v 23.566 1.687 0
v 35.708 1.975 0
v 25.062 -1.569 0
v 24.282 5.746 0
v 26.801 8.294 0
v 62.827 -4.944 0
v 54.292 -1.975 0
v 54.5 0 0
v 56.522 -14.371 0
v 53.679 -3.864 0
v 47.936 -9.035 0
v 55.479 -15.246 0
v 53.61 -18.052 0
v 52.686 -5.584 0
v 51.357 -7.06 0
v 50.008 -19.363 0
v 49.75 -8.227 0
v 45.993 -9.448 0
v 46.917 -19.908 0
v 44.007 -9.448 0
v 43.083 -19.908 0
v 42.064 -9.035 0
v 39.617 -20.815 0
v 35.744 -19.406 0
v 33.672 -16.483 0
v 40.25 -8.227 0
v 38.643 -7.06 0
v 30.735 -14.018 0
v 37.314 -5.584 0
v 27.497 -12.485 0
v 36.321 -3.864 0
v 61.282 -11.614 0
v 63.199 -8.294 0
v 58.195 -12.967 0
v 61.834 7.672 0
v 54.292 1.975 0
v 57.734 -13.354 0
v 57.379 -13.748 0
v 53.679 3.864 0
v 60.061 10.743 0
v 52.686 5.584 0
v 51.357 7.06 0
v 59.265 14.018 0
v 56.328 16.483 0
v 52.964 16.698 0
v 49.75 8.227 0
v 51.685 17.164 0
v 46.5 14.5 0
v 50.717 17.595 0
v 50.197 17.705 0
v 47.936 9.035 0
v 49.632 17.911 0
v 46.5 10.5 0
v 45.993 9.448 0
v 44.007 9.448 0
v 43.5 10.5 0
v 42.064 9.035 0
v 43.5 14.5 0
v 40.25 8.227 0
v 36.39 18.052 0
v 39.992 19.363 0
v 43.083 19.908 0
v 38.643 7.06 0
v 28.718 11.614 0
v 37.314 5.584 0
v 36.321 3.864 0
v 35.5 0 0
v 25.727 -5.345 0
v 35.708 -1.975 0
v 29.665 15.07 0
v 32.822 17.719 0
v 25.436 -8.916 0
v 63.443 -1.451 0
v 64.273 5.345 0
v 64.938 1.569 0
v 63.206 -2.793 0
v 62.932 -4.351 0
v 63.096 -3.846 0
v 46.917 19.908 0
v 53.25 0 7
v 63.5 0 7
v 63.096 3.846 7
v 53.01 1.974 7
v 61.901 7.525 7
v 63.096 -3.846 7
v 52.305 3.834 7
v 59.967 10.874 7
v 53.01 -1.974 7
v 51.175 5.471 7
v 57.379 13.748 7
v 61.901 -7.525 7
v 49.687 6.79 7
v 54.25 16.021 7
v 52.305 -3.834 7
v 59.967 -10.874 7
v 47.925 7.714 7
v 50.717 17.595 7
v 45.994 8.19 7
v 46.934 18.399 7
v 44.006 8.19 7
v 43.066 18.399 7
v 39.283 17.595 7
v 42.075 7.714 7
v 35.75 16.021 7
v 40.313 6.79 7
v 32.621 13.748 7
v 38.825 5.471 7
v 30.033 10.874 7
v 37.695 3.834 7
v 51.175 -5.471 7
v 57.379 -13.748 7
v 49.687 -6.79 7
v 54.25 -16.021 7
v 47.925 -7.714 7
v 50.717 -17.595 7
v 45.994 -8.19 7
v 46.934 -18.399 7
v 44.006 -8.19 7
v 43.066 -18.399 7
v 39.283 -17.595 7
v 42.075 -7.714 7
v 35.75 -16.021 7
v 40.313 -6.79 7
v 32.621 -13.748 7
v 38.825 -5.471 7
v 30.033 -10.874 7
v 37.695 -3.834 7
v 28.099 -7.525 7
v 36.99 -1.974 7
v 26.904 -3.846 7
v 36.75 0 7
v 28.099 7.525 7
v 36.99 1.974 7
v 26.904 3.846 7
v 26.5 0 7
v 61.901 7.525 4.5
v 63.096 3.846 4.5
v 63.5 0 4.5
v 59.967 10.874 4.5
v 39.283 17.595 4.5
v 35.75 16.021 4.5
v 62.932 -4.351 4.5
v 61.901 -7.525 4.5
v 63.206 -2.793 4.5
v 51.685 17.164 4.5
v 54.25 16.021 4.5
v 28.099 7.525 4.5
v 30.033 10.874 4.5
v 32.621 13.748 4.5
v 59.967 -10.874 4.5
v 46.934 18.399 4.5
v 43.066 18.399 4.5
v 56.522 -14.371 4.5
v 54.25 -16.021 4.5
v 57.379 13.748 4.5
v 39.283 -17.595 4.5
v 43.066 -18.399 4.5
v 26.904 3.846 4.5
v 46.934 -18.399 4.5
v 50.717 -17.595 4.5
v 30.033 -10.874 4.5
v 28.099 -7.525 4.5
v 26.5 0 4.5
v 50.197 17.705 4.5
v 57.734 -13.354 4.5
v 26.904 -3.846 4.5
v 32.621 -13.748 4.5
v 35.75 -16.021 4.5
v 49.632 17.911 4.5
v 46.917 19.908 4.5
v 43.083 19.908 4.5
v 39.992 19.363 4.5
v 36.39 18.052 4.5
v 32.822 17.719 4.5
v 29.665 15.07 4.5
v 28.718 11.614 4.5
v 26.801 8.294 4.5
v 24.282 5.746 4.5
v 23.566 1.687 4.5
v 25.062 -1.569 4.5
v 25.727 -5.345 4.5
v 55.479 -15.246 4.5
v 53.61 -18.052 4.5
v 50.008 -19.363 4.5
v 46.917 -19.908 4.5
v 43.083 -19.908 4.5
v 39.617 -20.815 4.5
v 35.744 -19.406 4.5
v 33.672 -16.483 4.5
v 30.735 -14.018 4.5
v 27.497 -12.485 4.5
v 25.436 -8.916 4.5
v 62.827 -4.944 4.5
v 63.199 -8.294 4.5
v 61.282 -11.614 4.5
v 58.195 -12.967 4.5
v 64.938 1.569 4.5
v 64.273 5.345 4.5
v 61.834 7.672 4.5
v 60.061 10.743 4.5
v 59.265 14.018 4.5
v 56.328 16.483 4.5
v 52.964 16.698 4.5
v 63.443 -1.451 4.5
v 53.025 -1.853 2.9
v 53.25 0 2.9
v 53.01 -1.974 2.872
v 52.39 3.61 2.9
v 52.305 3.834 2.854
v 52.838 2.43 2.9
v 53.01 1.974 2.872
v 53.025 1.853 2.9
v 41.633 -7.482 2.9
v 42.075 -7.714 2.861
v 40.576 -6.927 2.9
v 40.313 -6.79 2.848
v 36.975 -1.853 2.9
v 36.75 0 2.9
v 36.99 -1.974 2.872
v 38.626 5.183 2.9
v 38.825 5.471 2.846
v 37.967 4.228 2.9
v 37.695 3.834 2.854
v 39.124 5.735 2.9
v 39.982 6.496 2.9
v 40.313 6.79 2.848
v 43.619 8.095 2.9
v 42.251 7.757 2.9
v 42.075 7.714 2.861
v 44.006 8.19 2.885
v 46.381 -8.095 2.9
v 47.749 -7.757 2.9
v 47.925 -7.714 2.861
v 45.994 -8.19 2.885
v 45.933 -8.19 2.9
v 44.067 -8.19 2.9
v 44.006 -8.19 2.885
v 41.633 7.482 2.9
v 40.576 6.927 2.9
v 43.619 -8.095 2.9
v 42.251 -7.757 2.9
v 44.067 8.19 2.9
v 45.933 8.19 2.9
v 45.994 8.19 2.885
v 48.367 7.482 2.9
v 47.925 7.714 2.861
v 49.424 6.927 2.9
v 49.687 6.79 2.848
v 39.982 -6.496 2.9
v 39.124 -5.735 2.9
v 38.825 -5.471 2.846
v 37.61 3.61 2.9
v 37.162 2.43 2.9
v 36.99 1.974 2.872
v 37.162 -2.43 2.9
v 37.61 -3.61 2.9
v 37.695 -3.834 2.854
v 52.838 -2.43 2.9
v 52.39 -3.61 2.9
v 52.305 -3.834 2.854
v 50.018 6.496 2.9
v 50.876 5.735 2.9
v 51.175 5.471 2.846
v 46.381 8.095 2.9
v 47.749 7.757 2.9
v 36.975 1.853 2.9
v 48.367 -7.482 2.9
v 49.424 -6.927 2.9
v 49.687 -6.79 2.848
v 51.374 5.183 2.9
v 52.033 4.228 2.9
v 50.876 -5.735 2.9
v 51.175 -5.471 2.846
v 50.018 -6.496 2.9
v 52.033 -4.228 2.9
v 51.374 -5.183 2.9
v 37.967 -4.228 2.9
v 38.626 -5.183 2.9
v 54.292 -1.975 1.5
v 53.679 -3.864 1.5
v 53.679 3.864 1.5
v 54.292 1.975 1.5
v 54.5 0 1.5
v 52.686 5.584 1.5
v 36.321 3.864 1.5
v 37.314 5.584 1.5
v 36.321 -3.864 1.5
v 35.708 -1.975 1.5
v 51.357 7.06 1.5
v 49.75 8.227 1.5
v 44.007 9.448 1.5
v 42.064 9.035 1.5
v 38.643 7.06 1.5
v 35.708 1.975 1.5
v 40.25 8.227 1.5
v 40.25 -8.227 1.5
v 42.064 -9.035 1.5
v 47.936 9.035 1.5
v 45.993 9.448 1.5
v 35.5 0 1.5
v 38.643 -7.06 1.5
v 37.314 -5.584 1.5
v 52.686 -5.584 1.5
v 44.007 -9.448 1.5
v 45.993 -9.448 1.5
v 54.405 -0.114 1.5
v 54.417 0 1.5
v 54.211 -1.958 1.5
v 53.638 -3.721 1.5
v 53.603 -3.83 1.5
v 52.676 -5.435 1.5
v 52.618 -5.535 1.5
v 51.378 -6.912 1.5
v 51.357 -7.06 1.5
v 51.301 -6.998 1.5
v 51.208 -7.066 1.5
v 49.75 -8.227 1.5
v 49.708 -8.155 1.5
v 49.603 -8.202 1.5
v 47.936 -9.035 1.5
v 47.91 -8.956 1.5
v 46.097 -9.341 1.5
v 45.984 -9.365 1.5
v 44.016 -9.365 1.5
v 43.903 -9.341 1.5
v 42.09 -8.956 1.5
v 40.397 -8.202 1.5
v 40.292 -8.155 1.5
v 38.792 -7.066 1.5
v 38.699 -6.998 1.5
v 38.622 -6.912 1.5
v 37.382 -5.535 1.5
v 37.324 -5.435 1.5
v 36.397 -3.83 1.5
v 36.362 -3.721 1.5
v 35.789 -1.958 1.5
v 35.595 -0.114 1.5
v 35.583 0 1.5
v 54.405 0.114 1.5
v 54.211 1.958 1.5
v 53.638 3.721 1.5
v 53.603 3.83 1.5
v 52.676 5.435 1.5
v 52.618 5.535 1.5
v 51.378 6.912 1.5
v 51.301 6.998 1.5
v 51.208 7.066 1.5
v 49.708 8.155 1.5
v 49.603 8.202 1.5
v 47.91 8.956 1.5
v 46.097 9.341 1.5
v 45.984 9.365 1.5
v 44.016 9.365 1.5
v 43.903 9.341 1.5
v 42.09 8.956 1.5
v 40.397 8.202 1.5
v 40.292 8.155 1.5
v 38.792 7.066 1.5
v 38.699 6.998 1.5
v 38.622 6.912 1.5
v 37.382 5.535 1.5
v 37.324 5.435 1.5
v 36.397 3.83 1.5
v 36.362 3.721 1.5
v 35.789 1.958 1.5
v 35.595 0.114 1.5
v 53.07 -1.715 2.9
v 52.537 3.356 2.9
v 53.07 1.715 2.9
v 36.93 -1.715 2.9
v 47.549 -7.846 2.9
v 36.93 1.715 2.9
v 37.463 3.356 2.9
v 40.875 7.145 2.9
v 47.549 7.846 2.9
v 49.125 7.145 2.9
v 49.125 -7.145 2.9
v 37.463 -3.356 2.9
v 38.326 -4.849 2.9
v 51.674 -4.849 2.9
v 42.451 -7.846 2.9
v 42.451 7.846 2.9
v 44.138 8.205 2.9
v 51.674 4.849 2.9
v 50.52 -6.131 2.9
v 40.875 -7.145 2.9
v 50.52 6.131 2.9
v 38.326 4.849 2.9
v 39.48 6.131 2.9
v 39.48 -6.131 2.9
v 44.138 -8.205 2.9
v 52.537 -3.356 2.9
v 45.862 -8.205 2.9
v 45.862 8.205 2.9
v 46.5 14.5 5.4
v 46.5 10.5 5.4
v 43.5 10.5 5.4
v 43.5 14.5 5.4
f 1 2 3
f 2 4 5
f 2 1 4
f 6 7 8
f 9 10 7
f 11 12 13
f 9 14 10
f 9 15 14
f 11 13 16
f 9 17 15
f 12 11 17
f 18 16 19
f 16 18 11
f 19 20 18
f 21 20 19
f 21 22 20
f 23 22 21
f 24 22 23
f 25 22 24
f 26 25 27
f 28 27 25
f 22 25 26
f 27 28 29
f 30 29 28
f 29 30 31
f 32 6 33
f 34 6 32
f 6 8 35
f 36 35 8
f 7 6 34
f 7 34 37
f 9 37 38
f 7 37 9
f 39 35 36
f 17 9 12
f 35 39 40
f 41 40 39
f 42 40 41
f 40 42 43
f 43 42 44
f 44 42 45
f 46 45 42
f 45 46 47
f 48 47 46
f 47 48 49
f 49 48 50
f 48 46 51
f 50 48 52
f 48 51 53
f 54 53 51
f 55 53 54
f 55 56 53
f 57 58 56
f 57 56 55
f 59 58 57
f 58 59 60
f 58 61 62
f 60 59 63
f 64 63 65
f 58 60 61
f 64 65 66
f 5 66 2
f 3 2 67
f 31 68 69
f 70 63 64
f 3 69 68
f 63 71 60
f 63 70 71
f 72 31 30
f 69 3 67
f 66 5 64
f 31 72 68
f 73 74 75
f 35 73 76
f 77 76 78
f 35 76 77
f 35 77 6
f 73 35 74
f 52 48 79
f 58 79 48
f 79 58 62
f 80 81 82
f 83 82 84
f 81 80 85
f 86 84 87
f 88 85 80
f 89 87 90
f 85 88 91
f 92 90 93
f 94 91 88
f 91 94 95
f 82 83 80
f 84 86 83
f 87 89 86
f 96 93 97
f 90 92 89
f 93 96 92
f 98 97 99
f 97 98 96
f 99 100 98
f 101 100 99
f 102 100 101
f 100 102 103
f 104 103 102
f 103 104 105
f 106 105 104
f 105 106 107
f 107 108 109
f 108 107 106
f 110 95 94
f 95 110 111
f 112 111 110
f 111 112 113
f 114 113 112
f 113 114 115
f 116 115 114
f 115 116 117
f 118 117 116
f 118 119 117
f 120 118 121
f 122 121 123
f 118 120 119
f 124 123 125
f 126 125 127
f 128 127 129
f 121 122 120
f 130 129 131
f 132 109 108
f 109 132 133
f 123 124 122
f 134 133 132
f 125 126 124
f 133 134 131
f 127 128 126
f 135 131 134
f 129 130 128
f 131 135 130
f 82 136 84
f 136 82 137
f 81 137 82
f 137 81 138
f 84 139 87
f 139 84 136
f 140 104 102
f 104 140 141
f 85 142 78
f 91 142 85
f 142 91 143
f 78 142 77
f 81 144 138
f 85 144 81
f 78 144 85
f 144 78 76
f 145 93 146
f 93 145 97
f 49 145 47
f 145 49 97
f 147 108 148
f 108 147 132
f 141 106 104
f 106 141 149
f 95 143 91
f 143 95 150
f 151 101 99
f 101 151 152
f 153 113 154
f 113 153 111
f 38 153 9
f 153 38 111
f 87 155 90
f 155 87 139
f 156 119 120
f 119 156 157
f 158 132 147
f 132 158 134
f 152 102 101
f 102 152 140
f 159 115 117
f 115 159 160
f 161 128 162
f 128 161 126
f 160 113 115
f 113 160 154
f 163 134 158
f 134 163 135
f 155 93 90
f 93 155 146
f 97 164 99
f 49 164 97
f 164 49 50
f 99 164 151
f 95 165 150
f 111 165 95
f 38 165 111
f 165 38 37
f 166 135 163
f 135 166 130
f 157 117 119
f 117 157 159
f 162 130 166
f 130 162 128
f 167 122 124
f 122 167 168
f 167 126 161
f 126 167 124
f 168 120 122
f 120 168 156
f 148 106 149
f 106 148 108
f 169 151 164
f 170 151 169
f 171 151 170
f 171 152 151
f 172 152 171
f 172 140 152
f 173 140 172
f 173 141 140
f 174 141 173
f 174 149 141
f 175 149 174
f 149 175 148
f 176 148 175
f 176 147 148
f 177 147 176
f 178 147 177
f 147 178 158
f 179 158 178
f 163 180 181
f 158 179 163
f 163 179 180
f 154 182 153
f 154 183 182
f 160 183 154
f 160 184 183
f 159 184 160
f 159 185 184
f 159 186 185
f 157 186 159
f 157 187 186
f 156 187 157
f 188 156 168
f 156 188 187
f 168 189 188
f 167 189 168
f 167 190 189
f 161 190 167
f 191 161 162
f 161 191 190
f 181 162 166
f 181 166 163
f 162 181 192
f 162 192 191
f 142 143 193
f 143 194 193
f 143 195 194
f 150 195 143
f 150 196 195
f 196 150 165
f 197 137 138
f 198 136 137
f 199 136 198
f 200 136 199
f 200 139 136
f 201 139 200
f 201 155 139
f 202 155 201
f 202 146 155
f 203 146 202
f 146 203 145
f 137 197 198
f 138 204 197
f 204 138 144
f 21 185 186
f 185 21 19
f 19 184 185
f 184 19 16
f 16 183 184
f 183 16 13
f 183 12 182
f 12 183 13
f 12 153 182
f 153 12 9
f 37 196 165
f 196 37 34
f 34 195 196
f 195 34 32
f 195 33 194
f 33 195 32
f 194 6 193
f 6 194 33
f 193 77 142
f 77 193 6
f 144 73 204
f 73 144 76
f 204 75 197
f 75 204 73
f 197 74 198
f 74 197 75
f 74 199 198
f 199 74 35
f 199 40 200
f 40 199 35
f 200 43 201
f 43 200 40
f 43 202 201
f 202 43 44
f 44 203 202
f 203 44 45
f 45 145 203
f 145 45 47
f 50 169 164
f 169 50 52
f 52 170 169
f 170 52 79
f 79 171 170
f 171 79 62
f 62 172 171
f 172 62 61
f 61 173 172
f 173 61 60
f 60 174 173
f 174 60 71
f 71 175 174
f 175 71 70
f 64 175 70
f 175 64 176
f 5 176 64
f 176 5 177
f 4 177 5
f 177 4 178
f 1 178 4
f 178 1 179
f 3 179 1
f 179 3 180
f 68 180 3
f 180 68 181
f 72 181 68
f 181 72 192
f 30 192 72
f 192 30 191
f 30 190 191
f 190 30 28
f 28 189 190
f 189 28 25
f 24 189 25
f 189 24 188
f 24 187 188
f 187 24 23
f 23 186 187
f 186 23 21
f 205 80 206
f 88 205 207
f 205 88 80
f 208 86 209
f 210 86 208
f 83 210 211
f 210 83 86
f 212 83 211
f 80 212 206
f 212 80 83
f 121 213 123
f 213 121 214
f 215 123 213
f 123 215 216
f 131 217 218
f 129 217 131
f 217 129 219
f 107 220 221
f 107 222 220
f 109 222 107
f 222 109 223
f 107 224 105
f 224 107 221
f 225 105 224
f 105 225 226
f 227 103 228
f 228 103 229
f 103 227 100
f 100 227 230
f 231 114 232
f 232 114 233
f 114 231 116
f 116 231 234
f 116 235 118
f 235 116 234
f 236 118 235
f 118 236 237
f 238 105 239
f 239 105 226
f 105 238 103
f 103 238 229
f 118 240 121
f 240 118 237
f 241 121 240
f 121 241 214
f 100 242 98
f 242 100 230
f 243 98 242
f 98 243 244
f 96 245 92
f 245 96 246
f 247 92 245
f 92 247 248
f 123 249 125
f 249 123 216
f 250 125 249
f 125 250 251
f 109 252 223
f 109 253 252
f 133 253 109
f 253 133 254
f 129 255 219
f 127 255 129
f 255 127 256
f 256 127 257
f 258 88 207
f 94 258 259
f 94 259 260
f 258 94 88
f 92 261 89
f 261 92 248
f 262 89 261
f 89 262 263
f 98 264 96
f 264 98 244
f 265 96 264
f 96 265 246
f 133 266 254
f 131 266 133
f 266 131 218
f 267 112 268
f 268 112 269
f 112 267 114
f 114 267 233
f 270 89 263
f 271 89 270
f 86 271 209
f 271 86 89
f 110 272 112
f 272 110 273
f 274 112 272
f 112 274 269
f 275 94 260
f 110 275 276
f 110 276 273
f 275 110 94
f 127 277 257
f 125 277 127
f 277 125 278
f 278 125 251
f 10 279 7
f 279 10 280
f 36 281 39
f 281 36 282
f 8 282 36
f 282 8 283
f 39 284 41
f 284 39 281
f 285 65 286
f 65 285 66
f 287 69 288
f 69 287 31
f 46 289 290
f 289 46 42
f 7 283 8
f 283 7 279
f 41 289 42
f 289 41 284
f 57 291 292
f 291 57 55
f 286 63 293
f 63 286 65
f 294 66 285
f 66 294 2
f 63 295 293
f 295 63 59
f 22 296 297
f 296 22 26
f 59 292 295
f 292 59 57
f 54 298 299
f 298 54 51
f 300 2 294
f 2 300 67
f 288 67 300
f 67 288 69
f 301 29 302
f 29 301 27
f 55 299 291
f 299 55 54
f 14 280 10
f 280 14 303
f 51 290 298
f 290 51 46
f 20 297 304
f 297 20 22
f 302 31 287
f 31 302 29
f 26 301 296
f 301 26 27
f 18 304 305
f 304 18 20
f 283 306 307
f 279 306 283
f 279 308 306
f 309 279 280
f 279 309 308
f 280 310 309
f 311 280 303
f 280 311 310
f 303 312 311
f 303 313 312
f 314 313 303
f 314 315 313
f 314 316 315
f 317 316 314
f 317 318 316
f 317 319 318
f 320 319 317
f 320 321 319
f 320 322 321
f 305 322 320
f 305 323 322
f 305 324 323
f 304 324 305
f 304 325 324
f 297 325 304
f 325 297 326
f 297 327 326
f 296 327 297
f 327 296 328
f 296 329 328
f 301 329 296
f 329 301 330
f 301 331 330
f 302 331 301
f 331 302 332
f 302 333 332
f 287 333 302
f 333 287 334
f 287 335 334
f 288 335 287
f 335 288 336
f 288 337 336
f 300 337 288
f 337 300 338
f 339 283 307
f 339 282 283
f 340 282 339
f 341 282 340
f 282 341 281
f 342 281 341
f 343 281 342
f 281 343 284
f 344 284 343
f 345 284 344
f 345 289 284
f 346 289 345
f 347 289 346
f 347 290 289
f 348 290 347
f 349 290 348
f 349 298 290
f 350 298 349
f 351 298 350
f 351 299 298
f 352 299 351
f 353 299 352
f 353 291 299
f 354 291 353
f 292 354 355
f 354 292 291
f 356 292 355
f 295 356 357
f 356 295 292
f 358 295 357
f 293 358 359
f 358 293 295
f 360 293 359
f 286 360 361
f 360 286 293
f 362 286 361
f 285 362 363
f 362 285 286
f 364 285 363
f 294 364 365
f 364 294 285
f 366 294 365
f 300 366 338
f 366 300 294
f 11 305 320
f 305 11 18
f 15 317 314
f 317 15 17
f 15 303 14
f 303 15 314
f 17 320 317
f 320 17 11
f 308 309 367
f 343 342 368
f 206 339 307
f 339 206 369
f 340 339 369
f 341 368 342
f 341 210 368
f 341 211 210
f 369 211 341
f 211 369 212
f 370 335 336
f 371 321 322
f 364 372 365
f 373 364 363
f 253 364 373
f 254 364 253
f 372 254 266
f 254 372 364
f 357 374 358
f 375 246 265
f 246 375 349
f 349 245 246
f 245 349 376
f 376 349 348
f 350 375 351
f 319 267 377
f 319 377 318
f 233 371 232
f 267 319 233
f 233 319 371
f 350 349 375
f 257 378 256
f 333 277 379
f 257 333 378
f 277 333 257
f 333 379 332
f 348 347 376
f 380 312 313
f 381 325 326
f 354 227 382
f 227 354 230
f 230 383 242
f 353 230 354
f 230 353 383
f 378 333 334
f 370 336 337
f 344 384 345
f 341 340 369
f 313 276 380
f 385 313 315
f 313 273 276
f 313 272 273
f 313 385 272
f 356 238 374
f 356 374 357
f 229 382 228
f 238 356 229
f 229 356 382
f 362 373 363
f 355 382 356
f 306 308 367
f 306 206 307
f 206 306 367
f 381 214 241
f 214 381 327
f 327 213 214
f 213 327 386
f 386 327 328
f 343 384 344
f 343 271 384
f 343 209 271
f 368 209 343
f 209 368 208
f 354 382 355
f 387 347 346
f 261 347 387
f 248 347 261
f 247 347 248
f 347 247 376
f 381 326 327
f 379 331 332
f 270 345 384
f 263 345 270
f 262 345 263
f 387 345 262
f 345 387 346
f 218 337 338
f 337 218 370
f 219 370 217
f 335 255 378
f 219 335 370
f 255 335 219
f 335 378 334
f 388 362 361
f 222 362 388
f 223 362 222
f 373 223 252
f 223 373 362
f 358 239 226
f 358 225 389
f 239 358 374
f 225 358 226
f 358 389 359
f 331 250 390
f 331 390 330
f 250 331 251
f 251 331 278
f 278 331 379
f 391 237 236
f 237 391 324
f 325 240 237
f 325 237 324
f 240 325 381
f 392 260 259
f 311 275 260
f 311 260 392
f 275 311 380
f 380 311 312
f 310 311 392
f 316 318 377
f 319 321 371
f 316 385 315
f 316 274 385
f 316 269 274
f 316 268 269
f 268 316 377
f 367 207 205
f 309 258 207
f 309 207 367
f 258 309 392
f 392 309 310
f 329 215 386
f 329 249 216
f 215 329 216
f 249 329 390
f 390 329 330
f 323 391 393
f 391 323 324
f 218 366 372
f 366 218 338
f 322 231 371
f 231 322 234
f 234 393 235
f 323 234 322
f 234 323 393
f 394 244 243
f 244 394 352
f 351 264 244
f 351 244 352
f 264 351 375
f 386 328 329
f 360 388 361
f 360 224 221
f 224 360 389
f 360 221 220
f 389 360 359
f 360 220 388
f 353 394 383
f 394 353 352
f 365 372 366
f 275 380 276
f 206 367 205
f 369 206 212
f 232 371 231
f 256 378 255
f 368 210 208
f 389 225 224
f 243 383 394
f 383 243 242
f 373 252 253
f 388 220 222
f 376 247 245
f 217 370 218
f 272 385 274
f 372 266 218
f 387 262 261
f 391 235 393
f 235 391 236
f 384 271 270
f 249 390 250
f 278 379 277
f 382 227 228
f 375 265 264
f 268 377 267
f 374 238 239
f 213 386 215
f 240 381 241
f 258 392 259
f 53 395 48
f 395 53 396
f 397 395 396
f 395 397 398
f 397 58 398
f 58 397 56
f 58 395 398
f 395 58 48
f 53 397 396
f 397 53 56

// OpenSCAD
// file: Cam-as-18-Sided-Polygon.scad
/*  Provides a common method / function / module to 3D Print an 18 sided polygon for a cam used by Elna Supermatic, Elna SU machines sewing machines, matching with the 18 punches made by the needle per each rotation of a cam.

    Copyright (C) 2020  L Komandur

    This program is free software: you can redistribute it and/or modify
    it under the terms of the GNU General Public License as published by
    the Free Software Foundation, either version 3 of the License, or
    (at your option) any later version.

    This program is distributed in the hope that it will be useful,
    but WITHOUT ANY WARRANTY; without even the implied warranty of
    MERCHANTABILITY or FITNESS FOR A PARTICULAR PURPOSE.  See the
    GNU General Public License for more details.

    You should have received a copy of the GNU General Public License
    along with this program.  If not, see <https://www.gnu.org/licenses/>.
*/

thickest_cyl_rad = 17;
skirting_width=1.5;

angle_of_side = 11;
min_radius = thickest_cyl_rad+skirting_width;

module plotpoly(p1,p2,p3,p4,p5,p6,p7,p8,p9,p10,p11,p12,p13,p14,p15,p16,p17,p18) {
	//scale ([-1,1])
	polygon( points = [
	[(min_radius + p1)*sin(0-angle_of_side/2), (min_radius + p1)*cos(0-angle_of_side/2)],
	[(min_radius + p1)*sin(0+angle_of_side/2), (min_radius + p1)*cos(0+angle_of_side/2)],
	[(min_radius + p2)*sin(20-angle_of_side/2), (min_radius + p2)*cos(20-angle_of_side/2)],	
	[(min_radius + p2)*sin(20+angle_of_side/2), (min_radius + p2)*cos(20+angle_of_side/2)],	
	[(min_radius + p3)*sin(40-angle_of_side/2), (min_radius + p3)*cos(40-angle_of_side/2)],	
	[(min_radius + p3)*sin(40+angle_of_side/2), (min_radius + p3)*cos(40+angle_of_side/2)],	
	[(min_radius + p4)*sin(60-angle_of_side/2), (min_radius + p4)*cos(60-angle_of_side/2)],	
	[(min_radius + p4)*sin(60+angle_of_side/2), (min_radius + p4)*cos(60+angle_of_side/2)],	
	[(min_radius + p5)*sin(80-angle_of_side/2), (min_radius + p5)*cos(80-angle_of_side/2)],	
	[(min_radius + p5)*sin(80+angle_of_side/2), (min_radius + p5)*cos(80+angle_of_side/2)],	
	[(min_radius + p6)*sin(100-angle_of_side/2), (min_radius + p6)*cos(100-angle_of_side/2)],	
	[(min_radius + p6)*sin(100+angle_of_side/2), (min_radius + p6)*cos(100+angle_of_side/2)],	
	[(min_radius + p7)*sin(120-angle_of_side/2), (min_radius + p7)*cos(120-angle_of_side/2)],	
	[(min_radius + p7)*sin(120+angle_of_side/2), (min_radius + p7)*cos(120+angle_of_side/2)],	
	[(min_radius + p8)*sin(140-angle_of_side/2), (min_radius + p8)*cos(140-angle_of_side/2)],	
	[(min_radius + p8)*sin(140+angle_of_side/2), (min_radius + p8)*cos(140+angle_of_side/2)],	
	[(min_radius + p9)*sin(160-angle_of_side/2), (min_radius + p9)*cos(160-angle_of_side/2)],	
	[(min_radius + p9)*sin(160+angle_of_side/2), (min_radius + p9)*cos(160+angle_of_side/2)],	
	[(min_radius + p10)*sin(180-angle_of_side/2), (min_radius + p10)*cos(180-angle_of_side/2)],	
	[(min_radius + p10)*sin(180+angle_of_side/2), (min_radius + p10)*cos(180+angle_of_side/2)],	
	[(min_radius + p11)*sin(200-angle_of_side/2), (min_radius + p11)*cos(200-angle_of_side/2)],	
	[(min_radius + p11)*sin(200+angle_of_side/2), (min_radius + p11)*cos(200+angle_of_side/2)],	
	[(min_radius + p12)*sin(220-angle_of_side/2), (min_radius + p12)*cos(220-angle_of_side/2)],	
	[(min_radius + p12)*sin(220+angle_of_side/2), (min_radius + p12)*cos(220+angle_of_side/2)],	
	[(min_radius + p13)*sin(240-angle_of_side/2), (min_radius + p13)*cos(240-angle_of_side/2)],	
	[(min_radius + p13)*sin(240+angle_of_side/2), (min_radius + p13)*cos(240+angle_of_side/2)],	
	[(min_radius + p14)*sin(260-angle_of_side/2), (min_radius + p14)*cos(260-angle_of_side/2)],	
	[(min_radius + p14)*sin(260+angle_of_side/2), (min_radius + p14)*cos(260+angle_of_side/2)],	
	[(min_radius + p15)*sin(280-angle_of_side/2), (min_radius + p15)*cos(280-angle_of_side/2)],	
	[(min_radius + p15)*sin(280+angle_of_side/2), (min_radius + p15)*cos(280+angle_of_side/2)],	
	[(min_radius + p16)*sin(300-angle_of_side/2), (min_radius + p16)*cos(300-angle_of_side/2)],		
	[(min_radius + p16)*sin(300+angle_of_side/2), (min_radius + p16)*cos(300+angle_of_side/2)],		
	[(min_radius + p17)*sin(320-angle_of_side/2), (min_radius + p17)*cos(320-angle_of_side/2)],	
	[(min_radius + p17)*sin(320+angle_of_side/2), (min_radius + p17)*cos(320+angle_of_side/2)],	
	[(min_radius + p18)*sin(340-angle_of_side/2), (min_radius + p18)*cos(340-angle_of_side/2)],
	[(min_radius + p18)*sin(340+angle_of_side/2), (min_radius + p18)*cos(340+angle_of_side/2)]
	]);

}
// main file
/*  3D Prints a "single cam" similar to Cam No 13 of Elna Supermatic, Elna SU machines sewing machines.

    Copyright (C) 2020  L Komandur

    This program is free software: you can redistribute it and/or modify
    it under the terms of the GNU General Public License as published by
    the Free Software Foundation, either version 3 of the License, or
    (at your option) any later version.

    This program is distributed in the hope that it will be useful,
    but WITHOUT ANY WARRANTY; without even the implied warranty of
    MERCHANTABILITY or FITNESS FOR A PARTICULAR PURPOSE.  See the
    GNU General Public License for more details.

    You should have received a copy of the GNU General Public License
    along with this program.  If not, see <https://www.gnu.org/licenses/>.
*/
use <Cam-as-18-Sided-Polygon.scad>

double_disc_thickness = 9;

disc_thickness = 7; // 7 for single, 9 for double
thickest_cyl_rad = 17;

lobe_thickness = 4.5;
inner_hole_rad = 8.25;
hole_bigger_rad = 9.5;
bigger_hole_ht = 1.5;
cut_errors = 0.1;
hole_cone_ht = 1.5;
skirting = 0;


gap_bet_cloth_needle_cams = disc_thickness-2*skirting-2*lobe_thickness;

gap_to_transporthole = 1;

transporthole_width = 3;
transporthole_depth = 5.5;
transporthole_length  = 4;

peak=3;
c=peak/2;
l=0;
r=peak;
cl=peak/4;
cr=peak*3/4;
skirting_width=1.5;
min_radius = thickest_cyl_rad+skirting_width;


module letter(l,font="font.dxf",h=100,i=0) {
	union() {
		linear_extrude( height=h) import(font, layer=l[i]);
		translate([dxf_dim(file=font, name="advx",layer=l[i]),
			dxf_dim(file=font, name="advy",layer=l[i]),
			0])
			child();
	}
}

module word(wrd,font="font.dxf",h=100,i=0) {
	if(i < len(wrd)) {
		letter(wrd,font,h,i) word(wrd,font,h,i+1);
	} else {
		child();
	}
}


module print_s13_cam(x,y) {

	translate([x, y, 0]) rotate(a=[0,0,0]) difference() {
		union() {
			// tall INNER tall cylinder that excludes skirting 
		cylinder(h = disc_thickness, r = thickest_cyl_rad);
	
			// 2nd bigger cylinder shared between 2 cams and skirting; any sewing information would go here.
	
		translate([0, 0, skirting]) cylinder(h = disc_thickness - skirting*2, r = thickest_cyl_rad + skirting_width);
		translate([0, 0, skirting])
		linear_extrude (height  = lobe_thickness)
			plotpoly(c,l,c,l,c,l,c,l,c,c,r,c,r,c,r,c,r,c);
		
	
		}
	
		// Subtract the inner hole. Be very generous.
		translate([0, 0, disc_thickness/2])
			cylinder(h = disc_thickness+1, r = inner_hole_rad, center = true);
	
		// Subtract the lower wider hole
		translate([0, 0, -cut_errors])
			cylinder(h = bigger_hole_ht+cut_errors, r = hole_bigger_rad);
	
	
		// Subtract the cone between wide hole and smaller hole.
		translate([0, 0, bigger_hole_ht-cut_errors])
			cylinder(h = hole_cone_ht, r1 = hole_bigger_rad, r2 = inner_hole_rad);
	
		// Subtract the upper cone the disk locks on the sewing machine post (only for double cams).
		translate([0, 0, double_disc_thickness-skirting-2+cut_errors])
			cylinder(h = 2, r = hole_bigger_rad);
	
		// Initials on the side of transport hole as depressions (top side while printing).
	
		for (letter_depth = [1:6])
		{
			rotate(a=[0, 0, 0]) translate([-2.25, 10.5, disc_thickness-0.1*letter_depth]) scale(0.0015) letter("O");
			rotate(a=[0, 0, 0]) translate([-1.5, 11.25, disc_thickness-0.1*letter_depth]) scale(0.001) letter("O");
			rotate(a=[0, 0, 140]) translate([-8, 10, disc_thickness-0.1*letter_depth]) scale(0.002) letter("E");
			rotate(a=[0, 0, 130]) translate([-4, 11, disc_thickness-0.1*letter_depth]) scale(0.002) letter("L");
			rotate(a=[0, 0, 120]) translate([-0, 11, disc_thickness-0.1*letter_depth]) scale(0.002) letter("N");
			rotate(a=[0, 0, 110]) translate([4, 10, disc_thickness-0.1*letter_depth]) scale(0.002) letter("A");

			rotate(a=[0, 0, 115]) translate([-9, -15, disc_thickness-0.1*letter_depth]) scale(0.002) letter(" ");
			rotate(a=[0, 0, 115]) translate([-4, -16, disc_thickness-0.1*letter_depth]) scale(0.002) letter("1");
			rotate(a=[0, 0, 115]) translate([1, -16,disc_thickness-0.1*letter_depth]) scale(0.002) letter("3");
		}
		// Transport hole made as a rectangular  hole
		difference() {
			rotate(a=[0, 0, 0]) translate([0, hole_bigger_rad + gap_to_transporthole + transporthole_length/2, transporthole_depth/2-cut_errors])
				cube(size = [transporthole_width, transporthole_length, transporthole_depth], center = true);
	
		}
	}
}

print_s13_cam(45,0);
